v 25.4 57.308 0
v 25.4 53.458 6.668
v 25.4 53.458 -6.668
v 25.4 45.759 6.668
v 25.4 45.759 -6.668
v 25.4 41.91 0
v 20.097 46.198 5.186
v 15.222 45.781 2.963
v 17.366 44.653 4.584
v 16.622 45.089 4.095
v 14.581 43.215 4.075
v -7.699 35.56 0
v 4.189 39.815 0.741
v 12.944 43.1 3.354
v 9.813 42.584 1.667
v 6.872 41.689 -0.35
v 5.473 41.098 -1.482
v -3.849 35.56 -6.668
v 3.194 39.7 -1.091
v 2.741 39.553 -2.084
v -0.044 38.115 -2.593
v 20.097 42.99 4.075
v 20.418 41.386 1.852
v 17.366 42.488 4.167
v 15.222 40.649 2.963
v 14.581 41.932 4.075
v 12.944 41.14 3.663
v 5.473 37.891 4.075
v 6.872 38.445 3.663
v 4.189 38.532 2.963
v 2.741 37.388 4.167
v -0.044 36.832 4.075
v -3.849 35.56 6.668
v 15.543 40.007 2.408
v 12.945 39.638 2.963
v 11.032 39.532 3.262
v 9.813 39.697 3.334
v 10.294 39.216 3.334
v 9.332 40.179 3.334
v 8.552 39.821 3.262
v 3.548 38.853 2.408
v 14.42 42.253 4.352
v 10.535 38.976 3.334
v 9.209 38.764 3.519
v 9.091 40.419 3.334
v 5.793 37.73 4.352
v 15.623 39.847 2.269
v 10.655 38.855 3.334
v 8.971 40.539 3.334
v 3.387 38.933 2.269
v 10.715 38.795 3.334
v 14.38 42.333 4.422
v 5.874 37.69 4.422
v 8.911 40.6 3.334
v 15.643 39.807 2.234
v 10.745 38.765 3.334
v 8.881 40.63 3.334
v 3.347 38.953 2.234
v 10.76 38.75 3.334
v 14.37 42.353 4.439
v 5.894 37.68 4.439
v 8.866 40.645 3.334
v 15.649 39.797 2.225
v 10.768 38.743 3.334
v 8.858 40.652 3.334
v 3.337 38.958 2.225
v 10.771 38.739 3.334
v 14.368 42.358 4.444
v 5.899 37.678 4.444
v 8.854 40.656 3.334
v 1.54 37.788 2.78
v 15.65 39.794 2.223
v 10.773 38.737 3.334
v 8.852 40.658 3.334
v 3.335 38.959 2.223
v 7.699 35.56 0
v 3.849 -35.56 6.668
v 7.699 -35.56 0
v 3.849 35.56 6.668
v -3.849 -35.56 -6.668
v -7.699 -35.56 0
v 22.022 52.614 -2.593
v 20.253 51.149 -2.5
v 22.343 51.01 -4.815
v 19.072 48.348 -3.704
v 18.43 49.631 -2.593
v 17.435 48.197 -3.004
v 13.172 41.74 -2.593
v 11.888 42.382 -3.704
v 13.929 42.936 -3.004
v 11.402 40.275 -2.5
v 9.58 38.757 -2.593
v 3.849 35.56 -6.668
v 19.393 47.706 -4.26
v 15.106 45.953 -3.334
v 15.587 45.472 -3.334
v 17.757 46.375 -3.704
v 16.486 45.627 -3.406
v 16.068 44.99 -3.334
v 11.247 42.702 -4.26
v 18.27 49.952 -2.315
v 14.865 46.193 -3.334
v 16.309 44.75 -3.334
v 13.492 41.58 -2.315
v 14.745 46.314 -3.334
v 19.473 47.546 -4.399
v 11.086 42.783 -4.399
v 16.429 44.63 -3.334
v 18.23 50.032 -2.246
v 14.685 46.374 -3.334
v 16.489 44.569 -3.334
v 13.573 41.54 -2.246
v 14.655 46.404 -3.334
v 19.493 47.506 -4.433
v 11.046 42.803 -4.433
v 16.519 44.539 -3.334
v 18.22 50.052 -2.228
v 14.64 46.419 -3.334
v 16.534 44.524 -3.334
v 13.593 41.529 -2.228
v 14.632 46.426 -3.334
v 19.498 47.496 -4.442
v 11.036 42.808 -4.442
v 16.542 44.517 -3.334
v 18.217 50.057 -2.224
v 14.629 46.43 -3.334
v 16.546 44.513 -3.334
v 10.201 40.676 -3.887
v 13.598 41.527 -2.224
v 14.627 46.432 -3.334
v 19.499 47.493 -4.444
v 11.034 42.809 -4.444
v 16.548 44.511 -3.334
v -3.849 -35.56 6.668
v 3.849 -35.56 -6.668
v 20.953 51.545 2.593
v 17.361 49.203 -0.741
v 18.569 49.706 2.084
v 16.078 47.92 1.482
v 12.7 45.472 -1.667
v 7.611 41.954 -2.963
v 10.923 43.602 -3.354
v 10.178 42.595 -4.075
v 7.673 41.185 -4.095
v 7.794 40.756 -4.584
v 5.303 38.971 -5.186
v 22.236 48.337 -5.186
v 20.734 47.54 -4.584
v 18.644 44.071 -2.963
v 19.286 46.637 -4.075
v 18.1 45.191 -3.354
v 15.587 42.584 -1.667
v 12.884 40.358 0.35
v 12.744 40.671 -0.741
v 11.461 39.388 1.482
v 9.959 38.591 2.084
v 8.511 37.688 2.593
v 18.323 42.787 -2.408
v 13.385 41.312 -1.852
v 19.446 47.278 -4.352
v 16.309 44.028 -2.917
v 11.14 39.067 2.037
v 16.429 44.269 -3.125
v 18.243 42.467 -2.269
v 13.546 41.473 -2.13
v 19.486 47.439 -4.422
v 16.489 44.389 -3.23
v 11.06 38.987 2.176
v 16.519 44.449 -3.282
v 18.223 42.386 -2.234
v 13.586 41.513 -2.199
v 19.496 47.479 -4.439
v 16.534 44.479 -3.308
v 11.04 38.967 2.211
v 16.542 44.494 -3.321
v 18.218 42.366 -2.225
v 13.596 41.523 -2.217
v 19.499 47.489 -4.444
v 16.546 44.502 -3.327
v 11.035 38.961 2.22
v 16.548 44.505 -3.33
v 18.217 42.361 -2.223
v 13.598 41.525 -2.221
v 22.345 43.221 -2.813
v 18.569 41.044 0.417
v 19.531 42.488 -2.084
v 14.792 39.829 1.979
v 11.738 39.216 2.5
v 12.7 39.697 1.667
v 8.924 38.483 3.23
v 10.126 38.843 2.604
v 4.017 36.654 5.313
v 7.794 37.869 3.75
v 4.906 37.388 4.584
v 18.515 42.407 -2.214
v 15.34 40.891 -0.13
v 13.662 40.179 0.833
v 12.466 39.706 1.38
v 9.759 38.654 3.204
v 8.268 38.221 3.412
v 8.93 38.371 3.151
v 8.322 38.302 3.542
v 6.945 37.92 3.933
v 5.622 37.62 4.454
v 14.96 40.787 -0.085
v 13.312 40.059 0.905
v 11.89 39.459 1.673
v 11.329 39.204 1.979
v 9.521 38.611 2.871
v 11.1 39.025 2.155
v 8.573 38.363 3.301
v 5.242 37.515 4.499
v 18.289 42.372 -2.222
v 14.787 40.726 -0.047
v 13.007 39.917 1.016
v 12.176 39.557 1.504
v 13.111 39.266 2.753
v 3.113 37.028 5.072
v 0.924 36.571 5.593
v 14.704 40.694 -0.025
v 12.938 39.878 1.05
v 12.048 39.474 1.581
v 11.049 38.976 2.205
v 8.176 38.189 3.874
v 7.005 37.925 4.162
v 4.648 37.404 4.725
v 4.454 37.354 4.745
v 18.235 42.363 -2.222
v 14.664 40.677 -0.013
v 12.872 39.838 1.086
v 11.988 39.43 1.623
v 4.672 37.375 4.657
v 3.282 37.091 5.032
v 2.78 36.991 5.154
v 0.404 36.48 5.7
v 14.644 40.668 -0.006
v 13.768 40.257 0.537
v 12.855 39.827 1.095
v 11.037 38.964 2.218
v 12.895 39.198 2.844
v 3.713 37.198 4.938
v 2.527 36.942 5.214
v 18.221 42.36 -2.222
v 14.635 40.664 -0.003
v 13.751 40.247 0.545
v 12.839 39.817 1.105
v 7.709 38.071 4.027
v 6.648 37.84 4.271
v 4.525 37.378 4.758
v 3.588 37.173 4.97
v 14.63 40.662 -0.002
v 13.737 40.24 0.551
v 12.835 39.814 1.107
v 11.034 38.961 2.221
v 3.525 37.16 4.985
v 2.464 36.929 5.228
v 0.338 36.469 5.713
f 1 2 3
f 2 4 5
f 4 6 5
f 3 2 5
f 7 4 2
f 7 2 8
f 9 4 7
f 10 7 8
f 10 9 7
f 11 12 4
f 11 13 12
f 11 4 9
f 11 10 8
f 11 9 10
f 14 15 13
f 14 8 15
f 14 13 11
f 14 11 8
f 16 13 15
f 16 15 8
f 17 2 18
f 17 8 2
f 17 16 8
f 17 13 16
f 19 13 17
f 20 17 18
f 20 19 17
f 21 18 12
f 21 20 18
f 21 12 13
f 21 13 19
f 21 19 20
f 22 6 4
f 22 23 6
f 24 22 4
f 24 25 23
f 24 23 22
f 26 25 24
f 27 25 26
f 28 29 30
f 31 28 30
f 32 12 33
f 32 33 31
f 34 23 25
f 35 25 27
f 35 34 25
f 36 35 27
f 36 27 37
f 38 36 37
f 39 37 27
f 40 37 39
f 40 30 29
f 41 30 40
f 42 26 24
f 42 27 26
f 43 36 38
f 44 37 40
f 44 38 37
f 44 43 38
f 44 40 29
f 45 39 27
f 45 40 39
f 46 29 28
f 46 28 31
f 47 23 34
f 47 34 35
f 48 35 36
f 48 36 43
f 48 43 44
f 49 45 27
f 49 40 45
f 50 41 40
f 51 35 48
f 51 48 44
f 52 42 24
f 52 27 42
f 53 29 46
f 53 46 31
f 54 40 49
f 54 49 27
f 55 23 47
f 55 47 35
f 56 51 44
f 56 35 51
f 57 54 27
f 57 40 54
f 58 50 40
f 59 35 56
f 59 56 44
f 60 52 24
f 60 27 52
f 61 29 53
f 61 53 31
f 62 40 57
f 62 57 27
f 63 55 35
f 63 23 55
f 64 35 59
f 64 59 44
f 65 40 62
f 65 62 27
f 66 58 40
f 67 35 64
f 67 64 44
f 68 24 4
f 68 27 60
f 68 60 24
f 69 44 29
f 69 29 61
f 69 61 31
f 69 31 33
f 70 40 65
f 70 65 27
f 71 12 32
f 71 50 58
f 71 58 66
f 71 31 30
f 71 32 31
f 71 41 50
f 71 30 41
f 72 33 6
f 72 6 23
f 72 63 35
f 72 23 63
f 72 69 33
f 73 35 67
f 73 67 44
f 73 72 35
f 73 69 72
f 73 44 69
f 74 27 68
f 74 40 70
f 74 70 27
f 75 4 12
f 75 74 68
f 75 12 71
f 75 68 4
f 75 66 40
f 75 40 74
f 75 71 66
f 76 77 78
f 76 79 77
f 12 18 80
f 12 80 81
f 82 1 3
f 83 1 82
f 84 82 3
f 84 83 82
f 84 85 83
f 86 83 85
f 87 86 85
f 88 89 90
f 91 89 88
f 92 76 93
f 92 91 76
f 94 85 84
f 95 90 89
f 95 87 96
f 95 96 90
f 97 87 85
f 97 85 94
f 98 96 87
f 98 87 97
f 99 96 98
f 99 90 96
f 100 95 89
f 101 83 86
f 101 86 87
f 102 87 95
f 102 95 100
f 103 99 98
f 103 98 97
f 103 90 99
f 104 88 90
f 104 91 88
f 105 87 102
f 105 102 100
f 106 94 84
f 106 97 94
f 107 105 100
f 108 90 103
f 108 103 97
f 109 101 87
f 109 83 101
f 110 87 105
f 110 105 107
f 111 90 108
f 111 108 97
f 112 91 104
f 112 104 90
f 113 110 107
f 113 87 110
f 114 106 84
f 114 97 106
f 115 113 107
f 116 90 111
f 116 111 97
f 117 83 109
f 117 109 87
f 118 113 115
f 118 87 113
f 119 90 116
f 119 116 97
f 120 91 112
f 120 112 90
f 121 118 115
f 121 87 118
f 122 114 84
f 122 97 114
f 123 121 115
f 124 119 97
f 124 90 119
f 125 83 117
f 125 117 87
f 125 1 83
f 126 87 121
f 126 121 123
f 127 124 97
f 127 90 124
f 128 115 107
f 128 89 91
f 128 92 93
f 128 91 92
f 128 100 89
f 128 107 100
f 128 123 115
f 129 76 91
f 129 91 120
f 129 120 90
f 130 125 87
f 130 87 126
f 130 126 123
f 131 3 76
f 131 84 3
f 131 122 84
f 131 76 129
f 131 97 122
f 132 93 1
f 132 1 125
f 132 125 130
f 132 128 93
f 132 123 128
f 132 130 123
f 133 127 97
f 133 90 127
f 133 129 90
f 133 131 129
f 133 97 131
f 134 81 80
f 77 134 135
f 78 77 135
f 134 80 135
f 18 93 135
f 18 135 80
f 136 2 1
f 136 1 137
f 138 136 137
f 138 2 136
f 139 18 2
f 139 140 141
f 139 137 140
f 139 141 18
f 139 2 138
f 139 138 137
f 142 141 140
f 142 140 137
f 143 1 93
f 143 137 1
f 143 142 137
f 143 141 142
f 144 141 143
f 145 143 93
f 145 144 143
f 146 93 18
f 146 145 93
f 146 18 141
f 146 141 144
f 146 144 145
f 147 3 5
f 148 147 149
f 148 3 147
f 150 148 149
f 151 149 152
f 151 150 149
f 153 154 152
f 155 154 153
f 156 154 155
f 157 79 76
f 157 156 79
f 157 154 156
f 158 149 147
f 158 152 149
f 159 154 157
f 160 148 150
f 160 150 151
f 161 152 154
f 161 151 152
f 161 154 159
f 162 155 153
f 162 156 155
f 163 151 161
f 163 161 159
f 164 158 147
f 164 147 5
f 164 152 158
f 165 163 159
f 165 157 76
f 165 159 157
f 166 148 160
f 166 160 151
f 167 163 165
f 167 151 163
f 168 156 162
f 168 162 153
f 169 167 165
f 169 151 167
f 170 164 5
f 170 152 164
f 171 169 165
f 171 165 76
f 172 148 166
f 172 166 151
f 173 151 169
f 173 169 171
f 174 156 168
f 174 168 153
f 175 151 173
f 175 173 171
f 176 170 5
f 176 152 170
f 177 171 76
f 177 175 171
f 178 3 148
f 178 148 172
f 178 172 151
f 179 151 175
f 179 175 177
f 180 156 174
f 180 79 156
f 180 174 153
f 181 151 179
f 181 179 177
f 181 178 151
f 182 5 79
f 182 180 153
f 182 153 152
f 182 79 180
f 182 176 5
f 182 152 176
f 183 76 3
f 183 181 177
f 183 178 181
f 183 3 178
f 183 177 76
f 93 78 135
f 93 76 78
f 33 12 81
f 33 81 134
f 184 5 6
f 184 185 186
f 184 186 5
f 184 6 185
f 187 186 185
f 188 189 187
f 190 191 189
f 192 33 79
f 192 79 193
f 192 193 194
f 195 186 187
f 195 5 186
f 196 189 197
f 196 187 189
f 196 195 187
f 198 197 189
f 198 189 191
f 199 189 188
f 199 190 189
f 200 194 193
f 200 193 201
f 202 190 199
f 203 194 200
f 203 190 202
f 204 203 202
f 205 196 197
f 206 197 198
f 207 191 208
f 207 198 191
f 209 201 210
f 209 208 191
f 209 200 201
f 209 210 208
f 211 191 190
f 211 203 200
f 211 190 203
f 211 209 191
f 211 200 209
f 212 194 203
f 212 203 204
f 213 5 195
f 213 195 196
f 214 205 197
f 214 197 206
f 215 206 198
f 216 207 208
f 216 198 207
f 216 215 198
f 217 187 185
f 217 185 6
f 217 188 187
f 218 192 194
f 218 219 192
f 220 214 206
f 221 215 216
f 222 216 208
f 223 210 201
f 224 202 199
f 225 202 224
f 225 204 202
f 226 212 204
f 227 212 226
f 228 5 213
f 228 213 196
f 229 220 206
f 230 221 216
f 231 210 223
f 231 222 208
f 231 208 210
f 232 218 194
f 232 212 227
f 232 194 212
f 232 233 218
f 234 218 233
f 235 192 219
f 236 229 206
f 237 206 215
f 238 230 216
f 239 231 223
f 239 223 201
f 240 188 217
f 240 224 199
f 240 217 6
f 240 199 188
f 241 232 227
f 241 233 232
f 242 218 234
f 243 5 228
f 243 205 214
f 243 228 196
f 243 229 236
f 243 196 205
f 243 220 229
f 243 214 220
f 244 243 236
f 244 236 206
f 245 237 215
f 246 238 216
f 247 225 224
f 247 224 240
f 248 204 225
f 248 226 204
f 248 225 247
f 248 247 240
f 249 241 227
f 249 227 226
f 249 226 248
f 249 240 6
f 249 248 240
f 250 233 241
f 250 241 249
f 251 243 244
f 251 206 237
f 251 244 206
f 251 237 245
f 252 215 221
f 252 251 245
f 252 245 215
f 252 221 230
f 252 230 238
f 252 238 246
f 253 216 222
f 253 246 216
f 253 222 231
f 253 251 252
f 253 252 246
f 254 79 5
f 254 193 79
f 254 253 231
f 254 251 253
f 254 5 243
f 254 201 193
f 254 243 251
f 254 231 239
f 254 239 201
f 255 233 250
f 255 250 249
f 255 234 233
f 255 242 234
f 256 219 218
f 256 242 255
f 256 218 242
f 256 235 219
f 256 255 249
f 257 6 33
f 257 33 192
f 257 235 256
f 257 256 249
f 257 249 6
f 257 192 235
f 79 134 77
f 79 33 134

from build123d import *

# Parameters (mm, degrees)
BOSS_EXTRUDE1_DEPTH = 35.56


with BuildPart() as part:
    # Sketch1 → Boss-Extrude1 (new, symmetric)
    with BuildSketch(Plane(origin=(0, 0, 0), x_dir=(1, 0, 0), z_dir=(0, 1, 0))):
        Polygon((7.69896584, 0), (3.84948292, 6.6675), (-3.84948292, 6.6675), (-7.69896584, 0), (-3.84948292, -6.6675), (3.84948292, -6.6675), align=None)
    extrude(amount=BOSS_EXTRUDE1_DEPTH, both=True)

    # Loft2: read off the stored shape, not the designer's step
    # Loft2: loft between two sections, ruled curve by curve
    loft2_from = [
        Edge.make_bspline([(25.4, 45.75948292, 6.6675), (25.4, 47.042643893, 6.6675), (25.4, 48.325804866, 6.6675), (25.4, 50.892126813, 6.6675), (25.4, 52.175287786, 6.6675), (25.4, 53.458448759, 6.6675)], [0, 0, 0, 0, 0.5, 0.5, 1, 1, 1, 1], 3),
        Edge.make_bspline([(25.4, 53.458448759, 6.6675), (25.4, 54.100029246, 5.55625), (25.4, 54.741609733, 4.445), (25.4, 56.024770706, 2.2225), (25.4, 56.666351193, 1.11125), (25.4, 57.307931679, 0)], [0, 0, 0, 0, 0.5, 0.5, 1, 1, 1, 1], 3),
        Edge.make_bspline([(25.4, 41.91, 0), (25.4, 42.551580487, 1.11125), (25.4, 43.193160973, 2.2225), (25.4, 44.476321947, 4.445), (25.4, 45.117902433, 5.55625), (25.4, 45.75948292, 6.6675)], [0, 0, 0, 0, 0.5, 0.5, 1, 1, 1, 1], 3),
        Edge.make_bspline([(25.4, 57.307931679, 0), (25.4, 56.666351193, -1.11125), (25.4, 56.024770706, -2.2225), (25.4, 54.741609733, -4.445), (25.4, 54.100029246, -5.55625), (25.4, 53.458448759, -6.6675)], [0, 0, 0, 0, 0.5, 0.5, 1, 1, 1, 1], 3),
        Edge.make_bspline([(25.4, 53.458448759, -6.6675), (25.4, 52.175287786, -6.6675), (25.4, 50.892126813, -6.6675), (25.4, 48.325804866, -6.6675), (25.4, 47.042643893, -6.6675), (25.4, 45.75948292, -6.6675)], [0, 0, 0, 0, 0.5, 0.5, 1, 1, 1, 1], 3),
        Edge.make_bspline([(25.4, 45.75948292, -6.6675), (25.4, 45.117902433, -5.55625), (25.4, 44.476321947, -4.445), (25.4, 43.193160973, -2.2225), (25.4, 42.551580487, -1.11125), (25.4, 41.91, 0)], [0, 0, 0, 0, 0.5, 0.5, 1, 1, 1, 1], 3),
    ]
    loft2_to = [
        Edge.make_bspline([(-7.69896584, 35.56, 0), (-7.057385353, 35.56, -1.11125), (-6.415804866, 35.56, -2.2225), (-5.132643893, 35.56, -4.445), (-4.491063406, 35.56, -5.55625), (-3.84948292, 35.56, -6.6675)], [0, 0, 0, 0, 0.5, 0.5, 1, 1, 1, 1], 3),
        Edge.make_bspline([(-3.84948292, 35.56, -6.6675), (-2.566321947, 35.56, -6.6675), (-1.283160973, 35.56, -6.6675), (1.283160973, 35.56, -6.6675), (2.566321947, 35.56, -6.6675), (3.84948292, 35.56, -6.6675)], [0, 0, 0, 0, 0.5, 0.5, 1, 1, 1, 1], 3),
        Edge.make_bspline([(-3.84948292, 35.56, 6.6675), (-4.491063406, 35.56, 5.55625), (-5.132643893, 35.56, 4.445), (-6.415804866, 35.56, 2.2225), (-7.057385353, 35.56, 1.11125), (-7.69896584, 35.56, 0)], [0, 0, 0, 0, 0.5, 0.5, 1, 1, 1, 1], 3),
        Edge.make_bspline([(3.84948292, 35.56, -6.6675), (4.491063406, 35.56, -5.55625), (5.132643893, 35.56, -4.445), (6.415804866, 35.56, -2.2225), (7.057385353, 35.56, -1.11125), (7.69896584, 35.56, 0)], [0, 0, 0, 0, 0.5, 0.5, 1, 1, 1, 1], 3),
        Edge.make_bspline([(7.69896584, 35.56, 0), (7.057385353, 35.56, 1.11125), (6.415804866, 35.56, 2.2225), (5.132643893, 35.56, 4.445), (4.491063406, 35.56, 5.55625), (3.84948292, 35.56, 6.6675)], [0, 0, 0, 0, 0.5, 0.5, 1, 1, 1, 1], 3),
        Edge.make_bspline([(3.84948292, 35.56, 6.6675), (2.566321947, 35.56, 6.6675), (1.283160973, 35.56, 6.6675), (-1.283160973, 35.56, 6.6675), (-2.566321947, 35.56, 6.6675), (-3.84948292, 35.56, 6.6675)], [0, 0, 0, 0, 0.5, 0.5, 1, 1, 1, 1], 3),
    ]
    loft2 = Solid(Shell([*[Face.make_surface_from_curves(loft2_from[k], loft2_to[k]) for k in range(6)], Face(Wire(loft2_from)), Face(Wire(loft2_to))]))
    add(loft2)


solid = part.part
